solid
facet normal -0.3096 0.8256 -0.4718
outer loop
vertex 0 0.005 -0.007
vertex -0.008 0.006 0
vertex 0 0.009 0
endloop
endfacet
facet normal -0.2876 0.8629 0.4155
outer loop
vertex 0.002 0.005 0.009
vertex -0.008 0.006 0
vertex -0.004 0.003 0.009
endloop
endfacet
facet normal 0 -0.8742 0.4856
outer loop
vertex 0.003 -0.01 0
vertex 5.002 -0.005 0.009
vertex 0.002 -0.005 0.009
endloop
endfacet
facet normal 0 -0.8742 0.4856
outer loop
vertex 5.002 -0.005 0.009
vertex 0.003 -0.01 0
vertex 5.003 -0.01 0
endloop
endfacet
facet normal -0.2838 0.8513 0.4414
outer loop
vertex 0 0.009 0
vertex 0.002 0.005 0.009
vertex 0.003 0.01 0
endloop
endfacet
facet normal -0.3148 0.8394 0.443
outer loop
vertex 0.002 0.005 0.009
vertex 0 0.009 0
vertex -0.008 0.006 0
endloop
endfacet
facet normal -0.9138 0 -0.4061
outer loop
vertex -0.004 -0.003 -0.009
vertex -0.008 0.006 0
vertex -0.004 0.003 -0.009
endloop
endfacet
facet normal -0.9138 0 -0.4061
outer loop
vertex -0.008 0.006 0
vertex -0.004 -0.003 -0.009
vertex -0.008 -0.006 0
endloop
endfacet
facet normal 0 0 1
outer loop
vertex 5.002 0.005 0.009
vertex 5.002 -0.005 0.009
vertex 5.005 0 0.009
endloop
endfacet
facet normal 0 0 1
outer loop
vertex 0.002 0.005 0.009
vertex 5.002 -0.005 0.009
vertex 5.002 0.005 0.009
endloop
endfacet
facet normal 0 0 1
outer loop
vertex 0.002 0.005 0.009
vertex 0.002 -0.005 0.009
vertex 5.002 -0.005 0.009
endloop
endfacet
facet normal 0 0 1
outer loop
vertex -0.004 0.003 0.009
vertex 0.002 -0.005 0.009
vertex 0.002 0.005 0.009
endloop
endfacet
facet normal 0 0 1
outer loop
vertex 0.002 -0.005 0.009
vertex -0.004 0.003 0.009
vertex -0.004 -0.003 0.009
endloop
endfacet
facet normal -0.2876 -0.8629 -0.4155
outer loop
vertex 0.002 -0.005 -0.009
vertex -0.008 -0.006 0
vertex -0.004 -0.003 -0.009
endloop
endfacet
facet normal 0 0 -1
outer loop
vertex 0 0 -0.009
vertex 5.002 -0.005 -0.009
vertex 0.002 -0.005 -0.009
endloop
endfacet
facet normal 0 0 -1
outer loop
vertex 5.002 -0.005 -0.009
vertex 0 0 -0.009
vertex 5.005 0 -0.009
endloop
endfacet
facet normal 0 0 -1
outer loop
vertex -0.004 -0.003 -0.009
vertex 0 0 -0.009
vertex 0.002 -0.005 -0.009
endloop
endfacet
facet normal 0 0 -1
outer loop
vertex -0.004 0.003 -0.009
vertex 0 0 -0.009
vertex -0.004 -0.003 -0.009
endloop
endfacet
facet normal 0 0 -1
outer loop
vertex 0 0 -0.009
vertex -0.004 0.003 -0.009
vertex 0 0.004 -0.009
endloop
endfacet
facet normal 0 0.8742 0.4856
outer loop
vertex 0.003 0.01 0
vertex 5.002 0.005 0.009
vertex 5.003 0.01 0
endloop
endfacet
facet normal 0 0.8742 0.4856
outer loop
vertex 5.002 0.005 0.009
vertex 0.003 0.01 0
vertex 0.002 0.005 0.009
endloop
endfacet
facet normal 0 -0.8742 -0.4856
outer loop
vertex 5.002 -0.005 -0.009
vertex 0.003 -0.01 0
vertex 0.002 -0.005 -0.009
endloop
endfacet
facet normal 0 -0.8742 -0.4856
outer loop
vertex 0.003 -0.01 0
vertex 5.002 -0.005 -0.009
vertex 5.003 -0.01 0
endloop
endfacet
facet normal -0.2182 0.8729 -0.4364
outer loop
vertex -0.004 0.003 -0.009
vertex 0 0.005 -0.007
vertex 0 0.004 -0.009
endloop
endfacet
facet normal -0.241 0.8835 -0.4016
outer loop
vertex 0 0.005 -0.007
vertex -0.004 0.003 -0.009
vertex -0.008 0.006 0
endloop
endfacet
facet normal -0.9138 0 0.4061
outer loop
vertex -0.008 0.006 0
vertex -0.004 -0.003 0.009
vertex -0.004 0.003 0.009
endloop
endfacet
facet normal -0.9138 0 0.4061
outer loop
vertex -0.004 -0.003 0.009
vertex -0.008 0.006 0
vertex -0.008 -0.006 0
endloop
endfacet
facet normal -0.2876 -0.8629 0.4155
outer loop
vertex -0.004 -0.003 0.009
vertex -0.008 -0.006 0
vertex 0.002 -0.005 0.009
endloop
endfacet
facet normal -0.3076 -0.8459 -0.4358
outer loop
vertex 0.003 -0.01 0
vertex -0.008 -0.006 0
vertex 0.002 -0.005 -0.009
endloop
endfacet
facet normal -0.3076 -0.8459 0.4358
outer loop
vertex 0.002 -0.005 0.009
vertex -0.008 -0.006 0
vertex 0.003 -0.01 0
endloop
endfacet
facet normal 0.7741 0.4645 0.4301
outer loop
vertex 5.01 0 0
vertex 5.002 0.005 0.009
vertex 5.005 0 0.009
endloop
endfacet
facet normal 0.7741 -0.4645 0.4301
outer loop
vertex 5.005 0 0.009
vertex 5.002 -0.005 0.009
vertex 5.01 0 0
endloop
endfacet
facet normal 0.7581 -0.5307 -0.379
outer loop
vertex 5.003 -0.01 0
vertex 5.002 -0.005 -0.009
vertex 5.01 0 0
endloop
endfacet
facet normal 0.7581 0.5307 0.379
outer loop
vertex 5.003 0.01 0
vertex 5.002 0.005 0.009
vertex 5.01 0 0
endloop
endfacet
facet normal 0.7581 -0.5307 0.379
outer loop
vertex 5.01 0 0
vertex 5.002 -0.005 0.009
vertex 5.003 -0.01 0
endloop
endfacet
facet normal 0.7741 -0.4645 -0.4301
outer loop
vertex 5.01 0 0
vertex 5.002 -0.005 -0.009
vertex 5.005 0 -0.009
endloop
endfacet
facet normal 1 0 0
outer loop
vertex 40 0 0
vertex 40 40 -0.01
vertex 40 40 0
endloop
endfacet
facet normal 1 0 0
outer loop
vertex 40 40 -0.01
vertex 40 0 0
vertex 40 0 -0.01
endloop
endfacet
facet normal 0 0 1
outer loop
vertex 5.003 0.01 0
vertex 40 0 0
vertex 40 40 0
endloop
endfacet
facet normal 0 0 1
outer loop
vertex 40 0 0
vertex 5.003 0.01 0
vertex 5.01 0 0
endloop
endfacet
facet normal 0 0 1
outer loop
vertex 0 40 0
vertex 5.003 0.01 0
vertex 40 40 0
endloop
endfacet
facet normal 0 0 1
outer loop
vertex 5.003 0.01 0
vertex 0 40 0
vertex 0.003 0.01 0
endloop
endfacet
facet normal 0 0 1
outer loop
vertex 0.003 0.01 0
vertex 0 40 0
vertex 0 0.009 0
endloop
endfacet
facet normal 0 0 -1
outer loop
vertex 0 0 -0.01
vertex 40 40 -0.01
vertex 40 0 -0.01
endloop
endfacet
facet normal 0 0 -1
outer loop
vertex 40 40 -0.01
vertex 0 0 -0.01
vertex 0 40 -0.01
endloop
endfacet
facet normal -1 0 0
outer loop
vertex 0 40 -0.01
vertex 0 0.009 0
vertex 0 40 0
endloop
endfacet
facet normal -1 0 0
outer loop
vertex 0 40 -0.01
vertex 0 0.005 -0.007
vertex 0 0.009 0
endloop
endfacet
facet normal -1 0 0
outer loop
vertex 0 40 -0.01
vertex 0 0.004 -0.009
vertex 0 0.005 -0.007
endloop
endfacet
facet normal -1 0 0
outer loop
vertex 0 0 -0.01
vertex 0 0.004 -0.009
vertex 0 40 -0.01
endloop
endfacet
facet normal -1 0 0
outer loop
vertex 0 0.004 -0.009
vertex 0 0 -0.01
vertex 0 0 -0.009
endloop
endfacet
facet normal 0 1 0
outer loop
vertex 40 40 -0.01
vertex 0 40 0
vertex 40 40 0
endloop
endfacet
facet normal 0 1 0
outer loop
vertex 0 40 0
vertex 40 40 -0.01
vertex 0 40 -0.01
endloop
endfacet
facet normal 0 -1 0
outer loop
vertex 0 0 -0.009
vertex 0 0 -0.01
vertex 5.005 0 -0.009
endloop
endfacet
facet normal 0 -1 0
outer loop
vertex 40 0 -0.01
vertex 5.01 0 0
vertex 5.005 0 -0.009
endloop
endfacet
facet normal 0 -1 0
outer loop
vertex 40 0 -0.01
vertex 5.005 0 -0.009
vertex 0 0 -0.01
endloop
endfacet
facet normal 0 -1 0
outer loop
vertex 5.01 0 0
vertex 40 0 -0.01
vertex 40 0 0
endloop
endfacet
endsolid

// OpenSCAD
hull(){
    translate([0, 0]) sphere(0.01);
    translate([1, 0]) sphere(0.01);
}
hull(){
    translate([1, 0]) sphere(0.01);
    translate([2, 0]) sphere(0.01);
}
hull(){
    translate([2, 0]) sphere(0.01);
    translate([3, 0]) sphere(0.01);
}
hull(){
    translate([3, 0]) sphere(0.01);
    translate([4, 0]) sphere(0.01);
}
hull(){
    translate([4, 0]) sphere(0.01);
    translate([5, 0]) sphere(0.01);
}
translate([0,0,-0.01]) color([0.1,0.1,0.1]) cube([40,40,0.01]);
